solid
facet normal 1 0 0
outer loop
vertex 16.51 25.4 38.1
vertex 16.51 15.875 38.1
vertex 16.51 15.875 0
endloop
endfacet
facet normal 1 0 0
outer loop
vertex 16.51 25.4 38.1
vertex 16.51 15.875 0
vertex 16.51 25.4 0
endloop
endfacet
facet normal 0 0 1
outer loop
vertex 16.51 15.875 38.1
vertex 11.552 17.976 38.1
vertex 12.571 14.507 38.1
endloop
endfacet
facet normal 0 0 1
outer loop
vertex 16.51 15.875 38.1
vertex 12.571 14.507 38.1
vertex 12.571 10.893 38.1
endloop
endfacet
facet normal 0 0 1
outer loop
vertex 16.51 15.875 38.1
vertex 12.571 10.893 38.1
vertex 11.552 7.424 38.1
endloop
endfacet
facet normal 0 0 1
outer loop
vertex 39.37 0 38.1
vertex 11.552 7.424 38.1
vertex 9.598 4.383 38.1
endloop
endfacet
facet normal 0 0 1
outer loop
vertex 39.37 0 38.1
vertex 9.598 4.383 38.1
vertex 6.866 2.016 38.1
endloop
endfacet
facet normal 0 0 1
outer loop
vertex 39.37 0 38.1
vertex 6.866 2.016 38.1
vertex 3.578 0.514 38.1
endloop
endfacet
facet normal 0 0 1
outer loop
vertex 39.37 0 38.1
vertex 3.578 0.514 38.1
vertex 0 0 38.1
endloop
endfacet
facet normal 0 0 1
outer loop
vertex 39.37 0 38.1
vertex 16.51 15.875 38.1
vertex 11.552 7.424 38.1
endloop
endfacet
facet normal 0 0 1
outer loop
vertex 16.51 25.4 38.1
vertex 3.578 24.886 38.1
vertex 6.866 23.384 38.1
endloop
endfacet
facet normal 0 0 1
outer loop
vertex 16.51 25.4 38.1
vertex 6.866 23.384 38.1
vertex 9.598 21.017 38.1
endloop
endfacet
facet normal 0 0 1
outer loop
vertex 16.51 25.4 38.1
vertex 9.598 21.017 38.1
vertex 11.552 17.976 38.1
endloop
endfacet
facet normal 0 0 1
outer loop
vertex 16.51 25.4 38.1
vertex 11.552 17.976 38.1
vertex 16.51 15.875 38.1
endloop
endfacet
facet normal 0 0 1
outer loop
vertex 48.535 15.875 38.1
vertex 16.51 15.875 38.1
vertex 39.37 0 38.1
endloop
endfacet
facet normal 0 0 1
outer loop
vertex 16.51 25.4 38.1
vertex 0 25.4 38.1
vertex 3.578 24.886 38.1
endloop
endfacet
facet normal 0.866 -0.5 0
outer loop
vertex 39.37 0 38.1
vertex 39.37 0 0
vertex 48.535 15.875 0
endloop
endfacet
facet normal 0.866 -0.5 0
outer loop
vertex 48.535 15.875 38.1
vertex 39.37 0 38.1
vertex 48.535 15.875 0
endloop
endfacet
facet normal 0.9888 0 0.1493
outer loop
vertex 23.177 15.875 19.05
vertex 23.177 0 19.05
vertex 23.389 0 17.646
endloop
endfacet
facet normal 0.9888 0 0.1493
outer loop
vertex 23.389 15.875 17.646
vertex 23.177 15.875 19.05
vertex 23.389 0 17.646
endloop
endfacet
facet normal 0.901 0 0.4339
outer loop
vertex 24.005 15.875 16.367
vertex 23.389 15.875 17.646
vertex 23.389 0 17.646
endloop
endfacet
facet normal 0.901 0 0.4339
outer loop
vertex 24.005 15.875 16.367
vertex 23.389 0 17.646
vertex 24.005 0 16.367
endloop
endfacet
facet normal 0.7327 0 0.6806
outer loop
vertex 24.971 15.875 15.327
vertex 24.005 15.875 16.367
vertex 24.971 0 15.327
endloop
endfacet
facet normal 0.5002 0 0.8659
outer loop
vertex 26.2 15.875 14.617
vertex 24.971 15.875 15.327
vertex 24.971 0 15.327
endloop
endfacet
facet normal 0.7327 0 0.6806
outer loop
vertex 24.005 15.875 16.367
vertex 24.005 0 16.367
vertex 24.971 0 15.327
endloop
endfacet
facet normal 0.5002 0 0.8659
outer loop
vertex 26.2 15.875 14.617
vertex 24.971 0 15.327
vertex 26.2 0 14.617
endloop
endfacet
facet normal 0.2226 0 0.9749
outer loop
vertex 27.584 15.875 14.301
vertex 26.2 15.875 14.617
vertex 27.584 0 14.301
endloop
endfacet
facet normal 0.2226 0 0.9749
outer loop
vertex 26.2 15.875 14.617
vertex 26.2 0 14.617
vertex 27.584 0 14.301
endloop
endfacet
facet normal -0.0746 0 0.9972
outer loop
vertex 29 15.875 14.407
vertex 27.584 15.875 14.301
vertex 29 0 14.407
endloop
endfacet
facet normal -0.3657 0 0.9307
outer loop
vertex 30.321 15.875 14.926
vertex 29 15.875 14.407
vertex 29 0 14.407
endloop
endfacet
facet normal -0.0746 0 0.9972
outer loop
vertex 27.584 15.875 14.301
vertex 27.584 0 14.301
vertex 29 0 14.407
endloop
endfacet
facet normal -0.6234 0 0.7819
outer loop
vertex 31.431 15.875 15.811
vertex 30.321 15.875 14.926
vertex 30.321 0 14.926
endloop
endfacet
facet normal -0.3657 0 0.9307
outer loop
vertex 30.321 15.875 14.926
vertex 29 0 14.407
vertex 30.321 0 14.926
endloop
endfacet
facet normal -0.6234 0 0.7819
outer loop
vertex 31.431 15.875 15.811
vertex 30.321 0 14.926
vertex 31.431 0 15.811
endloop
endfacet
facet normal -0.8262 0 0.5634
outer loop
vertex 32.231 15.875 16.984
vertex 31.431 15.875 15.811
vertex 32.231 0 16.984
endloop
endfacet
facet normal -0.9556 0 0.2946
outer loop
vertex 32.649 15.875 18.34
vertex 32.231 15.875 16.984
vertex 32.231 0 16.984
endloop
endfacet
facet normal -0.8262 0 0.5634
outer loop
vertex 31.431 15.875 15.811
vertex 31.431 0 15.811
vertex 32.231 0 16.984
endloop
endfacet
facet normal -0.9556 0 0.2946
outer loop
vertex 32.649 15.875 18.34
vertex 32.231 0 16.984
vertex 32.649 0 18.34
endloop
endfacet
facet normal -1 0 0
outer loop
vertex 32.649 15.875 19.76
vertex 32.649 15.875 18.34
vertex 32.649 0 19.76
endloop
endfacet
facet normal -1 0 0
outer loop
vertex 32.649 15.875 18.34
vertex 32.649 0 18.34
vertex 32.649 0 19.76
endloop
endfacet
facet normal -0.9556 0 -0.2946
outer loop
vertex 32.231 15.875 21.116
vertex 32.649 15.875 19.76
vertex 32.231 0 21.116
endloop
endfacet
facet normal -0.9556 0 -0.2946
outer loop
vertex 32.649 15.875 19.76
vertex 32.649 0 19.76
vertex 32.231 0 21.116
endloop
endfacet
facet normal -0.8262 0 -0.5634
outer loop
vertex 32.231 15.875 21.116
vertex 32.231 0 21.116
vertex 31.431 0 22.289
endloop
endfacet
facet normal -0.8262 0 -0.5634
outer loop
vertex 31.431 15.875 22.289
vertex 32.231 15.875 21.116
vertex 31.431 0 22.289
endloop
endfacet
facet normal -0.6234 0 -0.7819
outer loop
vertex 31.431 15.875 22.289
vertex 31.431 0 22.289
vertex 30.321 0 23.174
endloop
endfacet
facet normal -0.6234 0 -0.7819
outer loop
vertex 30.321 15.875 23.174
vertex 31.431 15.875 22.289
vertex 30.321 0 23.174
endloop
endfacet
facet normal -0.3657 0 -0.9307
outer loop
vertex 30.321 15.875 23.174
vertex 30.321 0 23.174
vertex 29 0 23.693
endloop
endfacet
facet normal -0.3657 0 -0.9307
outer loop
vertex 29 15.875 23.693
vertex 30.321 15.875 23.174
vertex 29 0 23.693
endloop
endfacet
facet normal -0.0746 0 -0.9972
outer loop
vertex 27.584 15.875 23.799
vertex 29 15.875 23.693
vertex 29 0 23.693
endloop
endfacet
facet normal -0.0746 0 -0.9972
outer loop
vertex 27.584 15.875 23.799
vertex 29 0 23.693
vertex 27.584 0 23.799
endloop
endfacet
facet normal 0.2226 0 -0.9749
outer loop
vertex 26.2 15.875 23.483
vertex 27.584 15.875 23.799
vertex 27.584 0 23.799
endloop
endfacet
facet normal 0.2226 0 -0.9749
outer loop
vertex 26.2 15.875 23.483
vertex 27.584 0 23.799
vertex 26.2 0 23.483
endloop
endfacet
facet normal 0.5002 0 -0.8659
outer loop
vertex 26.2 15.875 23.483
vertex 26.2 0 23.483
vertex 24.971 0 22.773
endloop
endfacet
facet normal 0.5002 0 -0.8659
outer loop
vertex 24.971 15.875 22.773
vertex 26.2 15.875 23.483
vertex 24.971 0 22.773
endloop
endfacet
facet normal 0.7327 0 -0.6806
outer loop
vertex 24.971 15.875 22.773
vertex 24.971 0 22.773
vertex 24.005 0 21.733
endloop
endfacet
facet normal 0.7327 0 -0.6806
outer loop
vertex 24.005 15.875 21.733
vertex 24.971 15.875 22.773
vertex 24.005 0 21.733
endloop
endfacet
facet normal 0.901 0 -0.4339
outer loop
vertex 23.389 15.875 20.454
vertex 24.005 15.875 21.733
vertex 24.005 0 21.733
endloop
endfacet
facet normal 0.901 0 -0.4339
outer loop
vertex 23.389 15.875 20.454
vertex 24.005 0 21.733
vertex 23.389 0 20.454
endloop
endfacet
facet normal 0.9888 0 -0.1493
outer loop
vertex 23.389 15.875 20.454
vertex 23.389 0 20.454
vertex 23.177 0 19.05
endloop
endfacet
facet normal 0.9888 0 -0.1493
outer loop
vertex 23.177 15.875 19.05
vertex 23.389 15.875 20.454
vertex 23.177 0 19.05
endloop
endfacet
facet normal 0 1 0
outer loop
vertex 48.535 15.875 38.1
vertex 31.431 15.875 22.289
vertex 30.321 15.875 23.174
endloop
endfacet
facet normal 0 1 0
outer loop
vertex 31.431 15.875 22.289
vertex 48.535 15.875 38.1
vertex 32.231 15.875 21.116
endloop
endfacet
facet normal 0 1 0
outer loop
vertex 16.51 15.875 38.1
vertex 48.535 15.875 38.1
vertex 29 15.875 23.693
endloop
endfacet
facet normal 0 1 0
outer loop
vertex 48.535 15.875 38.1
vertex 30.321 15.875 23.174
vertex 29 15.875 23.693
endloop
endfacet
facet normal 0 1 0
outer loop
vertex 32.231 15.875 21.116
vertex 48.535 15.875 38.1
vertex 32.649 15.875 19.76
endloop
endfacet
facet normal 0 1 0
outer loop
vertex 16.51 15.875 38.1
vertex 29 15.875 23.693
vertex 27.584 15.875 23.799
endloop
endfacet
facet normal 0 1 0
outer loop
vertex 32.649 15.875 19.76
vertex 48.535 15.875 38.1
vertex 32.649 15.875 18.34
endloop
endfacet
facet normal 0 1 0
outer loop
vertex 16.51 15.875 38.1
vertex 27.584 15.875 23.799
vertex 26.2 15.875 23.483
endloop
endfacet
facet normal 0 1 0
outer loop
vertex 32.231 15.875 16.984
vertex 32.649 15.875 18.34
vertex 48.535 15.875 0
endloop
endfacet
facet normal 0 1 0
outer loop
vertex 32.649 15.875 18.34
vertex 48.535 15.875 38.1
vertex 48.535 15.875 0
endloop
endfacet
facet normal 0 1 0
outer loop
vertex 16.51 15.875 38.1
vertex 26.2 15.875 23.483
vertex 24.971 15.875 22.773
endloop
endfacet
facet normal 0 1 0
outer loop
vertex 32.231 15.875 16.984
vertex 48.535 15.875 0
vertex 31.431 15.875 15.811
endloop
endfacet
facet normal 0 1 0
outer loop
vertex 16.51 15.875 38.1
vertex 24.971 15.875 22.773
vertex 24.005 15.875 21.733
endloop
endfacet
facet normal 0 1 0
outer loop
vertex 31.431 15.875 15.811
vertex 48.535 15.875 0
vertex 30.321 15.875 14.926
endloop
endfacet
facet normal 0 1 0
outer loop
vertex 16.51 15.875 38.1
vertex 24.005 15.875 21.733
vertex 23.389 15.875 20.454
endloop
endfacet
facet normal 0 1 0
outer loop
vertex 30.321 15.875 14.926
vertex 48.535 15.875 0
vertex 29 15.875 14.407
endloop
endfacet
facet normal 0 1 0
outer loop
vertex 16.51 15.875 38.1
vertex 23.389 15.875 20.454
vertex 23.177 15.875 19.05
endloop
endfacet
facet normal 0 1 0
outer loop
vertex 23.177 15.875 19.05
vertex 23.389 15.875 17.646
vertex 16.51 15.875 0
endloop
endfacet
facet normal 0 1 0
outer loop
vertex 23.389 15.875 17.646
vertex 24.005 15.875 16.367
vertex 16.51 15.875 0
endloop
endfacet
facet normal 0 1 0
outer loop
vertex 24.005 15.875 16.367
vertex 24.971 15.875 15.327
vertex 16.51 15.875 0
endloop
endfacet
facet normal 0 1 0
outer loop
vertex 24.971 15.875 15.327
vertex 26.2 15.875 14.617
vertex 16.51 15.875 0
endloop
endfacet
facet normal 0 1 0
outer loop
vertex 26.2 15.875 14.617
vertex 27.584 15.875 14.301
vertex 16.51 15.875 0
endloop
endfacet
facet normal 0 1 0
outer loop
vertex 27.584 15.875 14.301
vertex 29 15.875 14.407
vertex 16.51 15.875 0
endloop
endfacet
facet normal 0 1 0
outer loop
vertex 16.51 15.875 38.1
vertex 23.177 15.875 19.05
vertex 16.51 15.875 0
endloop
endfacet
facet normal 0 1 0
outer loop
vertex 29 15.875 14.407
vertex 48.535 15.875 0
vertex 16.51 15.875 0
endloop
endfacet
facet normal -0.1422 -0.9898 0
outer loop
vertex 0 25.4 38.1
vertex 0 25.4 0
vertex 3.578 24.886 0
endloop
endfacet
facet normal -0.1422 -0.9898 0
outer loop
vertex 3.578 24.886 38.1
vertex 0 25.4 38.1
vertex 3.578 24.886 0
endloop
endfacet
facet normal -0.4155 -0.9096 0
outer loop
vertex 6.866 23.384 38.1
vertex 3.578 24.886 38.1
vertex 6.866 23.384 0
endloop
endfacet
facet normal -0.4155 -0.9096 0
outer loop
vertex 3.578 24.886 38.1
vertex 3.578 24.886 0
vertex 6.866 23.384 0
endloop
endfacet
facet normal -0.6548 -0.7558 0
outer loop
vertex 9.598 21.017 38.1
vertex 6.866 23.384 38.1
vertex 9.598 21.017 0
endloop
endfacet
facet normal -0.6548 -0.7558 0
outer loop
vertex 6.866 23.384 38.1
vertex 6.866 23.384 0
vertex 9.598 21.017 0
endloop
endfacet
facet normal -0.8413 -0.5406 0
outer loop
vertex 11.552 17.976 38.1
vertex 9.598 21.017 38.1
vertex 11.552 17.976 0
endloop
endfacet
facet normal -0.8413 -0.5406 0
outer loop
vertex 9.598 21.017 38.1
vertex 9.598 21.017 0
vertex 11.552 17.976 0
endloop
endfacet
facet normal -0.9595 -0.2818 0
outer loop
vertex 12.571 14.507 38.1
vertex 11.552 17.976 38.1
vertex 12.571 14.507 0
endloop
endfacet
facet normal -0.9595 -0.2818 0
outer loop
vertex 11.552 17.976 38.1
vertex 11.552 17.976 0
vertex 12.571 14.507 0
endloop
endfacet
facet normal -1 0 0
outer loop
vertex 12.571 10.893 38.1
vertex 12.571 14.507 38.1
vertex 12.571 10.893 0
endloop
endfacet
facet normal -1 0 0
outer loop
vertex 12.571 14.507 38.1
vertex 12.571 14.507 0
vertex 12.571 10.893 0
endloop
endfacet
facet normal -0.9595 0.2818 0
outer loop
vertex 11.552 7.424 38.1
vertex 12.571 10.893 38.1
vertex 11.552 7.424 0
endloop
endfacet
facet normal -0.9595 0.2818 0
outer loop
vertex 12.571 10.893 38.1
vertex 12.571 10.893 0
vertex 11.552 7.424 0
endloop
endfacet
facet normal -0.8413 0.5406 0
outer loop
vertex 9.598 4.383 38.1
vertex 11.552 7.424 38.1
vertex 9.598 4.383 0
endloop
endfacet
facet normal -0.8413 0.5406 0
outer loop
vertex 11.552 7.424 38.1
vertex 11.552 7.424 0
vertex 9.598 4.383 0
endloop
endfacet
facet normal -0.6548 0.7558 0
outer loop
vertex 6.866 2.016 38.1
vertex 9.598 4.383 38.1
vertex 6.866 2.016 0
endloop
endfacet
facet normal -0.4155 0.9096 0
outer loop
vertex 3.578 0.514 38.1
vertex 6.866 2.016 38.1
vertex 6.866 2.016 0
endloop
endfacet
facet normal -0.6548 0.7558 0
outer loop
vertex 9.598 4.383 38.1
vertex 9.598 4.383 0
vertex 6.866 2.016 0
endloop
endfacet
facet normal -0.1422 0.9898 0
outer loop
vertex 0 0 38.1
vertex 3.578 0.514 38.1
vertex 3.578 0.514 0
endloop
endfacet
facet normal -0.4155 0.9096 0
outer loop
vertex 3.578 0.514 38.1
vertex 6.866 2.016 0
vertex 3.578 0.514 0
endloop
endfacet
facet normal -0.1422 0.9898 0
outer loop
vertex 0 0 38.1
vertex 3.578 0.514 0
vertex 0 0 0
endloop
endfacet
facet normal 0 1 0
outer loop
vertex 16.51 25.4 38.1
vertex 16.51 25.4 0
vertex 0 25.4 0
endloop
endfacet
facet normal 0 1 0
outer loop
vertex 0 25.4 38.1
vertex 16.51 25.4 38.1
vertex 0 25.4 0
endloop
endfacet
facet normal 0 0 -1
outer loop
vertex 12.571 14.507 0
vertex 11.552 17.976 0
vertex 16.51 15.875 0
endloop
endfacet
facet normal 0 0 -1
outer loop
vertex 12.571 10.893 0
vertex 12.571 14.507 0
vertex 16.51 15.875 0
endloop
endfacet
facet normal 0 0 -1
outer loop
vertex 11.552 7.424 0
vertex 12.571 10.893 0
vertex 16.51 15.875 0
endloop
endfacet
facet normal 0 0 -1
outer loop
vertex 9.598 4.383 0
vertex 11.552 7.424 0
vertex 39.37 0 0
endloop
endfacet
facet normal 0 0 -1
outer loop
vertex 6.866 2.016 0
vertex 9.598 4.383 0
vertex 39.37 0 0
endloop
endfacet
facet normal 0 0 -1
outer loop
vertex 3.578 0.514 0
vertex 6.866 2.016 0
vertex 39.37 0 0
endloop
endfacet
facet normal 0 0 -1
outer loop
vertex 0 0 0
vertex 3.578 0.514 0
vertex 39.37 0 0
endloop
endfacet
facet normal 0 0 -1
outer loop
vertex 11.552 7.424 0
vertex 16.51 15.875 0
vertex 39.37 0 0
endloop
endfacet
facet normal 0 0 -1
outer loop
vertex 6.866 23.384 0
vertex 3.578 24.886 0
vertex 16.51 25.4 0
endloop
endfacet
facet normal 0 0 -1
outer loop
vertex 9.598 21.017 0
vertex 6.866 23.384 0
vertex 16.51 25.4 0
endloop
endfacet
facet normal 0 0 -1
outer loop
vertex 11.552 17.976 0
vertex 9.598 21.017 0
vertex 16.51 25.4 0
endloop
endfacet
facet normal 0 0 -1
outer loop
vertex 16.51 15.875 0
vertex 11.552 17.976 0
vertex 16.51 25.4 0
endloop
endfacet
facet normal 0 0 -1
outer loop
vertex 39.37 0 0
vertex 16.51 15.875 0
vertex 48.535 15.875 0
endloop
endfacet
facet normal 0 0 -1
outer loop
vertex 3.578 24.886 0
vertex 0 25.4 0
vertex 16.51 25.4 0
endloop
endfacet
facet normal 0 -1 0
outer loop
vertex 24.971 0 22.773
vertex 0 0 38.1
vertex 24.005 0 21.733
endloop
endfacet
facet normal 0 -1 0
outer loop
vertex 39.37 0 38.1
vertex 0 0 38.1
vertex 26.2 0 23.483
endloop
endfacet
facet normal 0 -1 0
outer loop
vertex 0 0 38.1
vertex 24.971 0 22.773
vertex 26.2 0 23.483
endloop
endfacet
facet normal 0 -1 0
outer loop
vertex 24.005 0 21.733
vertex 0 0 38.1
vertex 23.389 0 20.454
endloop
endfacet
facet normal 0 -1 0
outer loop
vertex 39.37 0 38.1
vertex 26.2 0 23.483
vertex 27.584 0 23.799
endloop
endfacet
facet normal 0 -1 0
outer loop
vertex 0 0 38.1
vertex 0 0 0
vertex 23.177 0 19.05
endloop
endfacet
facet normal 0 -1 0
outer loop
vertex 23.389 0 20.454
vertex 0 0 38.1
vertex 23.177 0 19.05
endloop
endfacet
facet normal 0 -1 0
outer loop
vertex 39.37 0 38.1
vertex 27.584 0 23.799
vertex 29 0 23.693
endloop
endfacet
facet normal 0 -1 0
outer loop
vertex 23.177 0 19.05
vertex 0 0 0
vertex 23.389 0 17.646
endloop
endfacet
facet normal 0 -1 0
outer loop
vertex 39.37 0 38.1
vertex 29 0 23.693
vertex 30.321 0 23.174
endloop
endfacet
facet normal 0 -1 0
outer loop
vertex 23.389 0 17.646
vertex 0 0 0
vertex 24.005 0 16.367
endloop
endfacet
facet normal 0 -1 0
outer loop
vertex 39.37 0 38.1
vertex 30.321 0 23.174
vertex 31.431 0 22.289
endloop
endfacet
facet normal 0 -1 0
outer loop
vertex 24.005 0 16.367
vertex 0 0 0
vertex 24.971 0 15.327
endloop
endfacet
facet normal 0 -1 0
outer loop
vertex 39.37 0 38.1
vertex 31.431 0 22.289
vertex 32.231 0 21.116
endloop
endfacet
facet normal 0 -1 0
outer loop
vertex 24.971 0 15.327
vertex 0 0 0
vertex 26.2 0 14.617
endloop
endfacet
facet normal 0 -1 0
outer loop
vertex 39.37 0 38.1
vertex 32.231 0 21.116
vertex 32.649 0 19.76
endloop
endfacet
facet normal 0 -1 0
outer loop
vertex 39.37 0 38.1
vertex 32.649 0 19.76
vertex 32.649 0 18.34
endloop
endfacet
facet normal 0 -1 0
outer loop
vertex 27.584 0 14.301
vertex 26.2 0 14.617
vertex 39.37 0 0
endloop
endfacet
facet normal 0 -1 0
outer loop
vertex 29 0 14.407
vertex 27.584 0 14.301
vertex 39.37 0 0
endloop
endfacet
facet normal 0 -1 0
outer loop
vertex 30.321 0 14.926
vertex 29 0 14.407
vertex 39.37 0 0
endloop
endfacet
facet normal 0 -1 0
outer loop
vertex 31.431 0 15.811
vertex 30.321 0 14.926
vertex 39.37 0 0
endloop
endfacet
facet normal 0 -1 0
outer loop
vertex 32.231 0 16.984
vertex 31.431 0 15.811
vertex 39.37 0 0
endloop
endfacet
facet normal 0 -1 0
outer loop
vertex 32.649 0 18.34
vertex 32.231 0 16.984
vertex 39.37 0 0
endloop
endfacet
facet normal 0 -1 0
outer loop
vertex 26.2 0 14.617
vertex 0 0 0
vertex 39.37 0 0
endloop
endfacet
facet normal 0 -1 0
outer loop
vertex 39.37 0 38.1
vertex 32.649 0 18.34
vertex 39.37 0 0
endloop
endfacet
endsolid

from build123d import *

# Parameters (mm, degrees)
BOSS_EXTRUDE1_DEPTH          = 38.1
CHAMFER1_SIZE                = 11.43
CHAMFER1_SIZE_2              = 19.797340731
F_3_8_0_375_DIAMETER_HOLE1_D = 9.525


with BuildPart() as part:
    # Sketch1 → Boss-Extrude1 (new body)
    with BuildSketch(Plane.XY):
        with BuildLine():
            Line((0, 0), (50.8, 0))
            Line((50.8, 0), (50.8, 15.875))
            Line((50.8, 15.875), (16.51, 15.875))
            Line((16.51, 15.875), (16.51, 25.4))
            Line((16.51, 25.4), (0, 25.4))
            ThreePointArc((0, 25.4), (12.7, 12.7), (0, 0))
        make_face()
    extrude(amount=BOSS_EXTRUDE1_DEPTH)

    # Chamfer1
    # the kernel refuses this chamfer: 19.797340731, 11.43 mm, written as the material it takes off along each edge
    with BuildSketch(Plane(origin=(50.8, 0, -51.217418184), x_dir=(-0.9983227437537926, -0.05789386240267138, 0), z_dir=(0, 0, 1))) as chamfer1_piece_1:
        Polygon((CHAMFER1_SIZE * 0.998322743754, -CHAMFER1_SIZE * 0.0578938624027), (-CHAMFER1_SIZE_2 * 0.0578938624012, -CHAMFER1_SIZE_2 * 0.998322743729), (0, 0), align=None)
    extrude(amount=140.534836368, mode=Mode.SUBTRACT)

    # 3/8 (0.375) Diameter Hole1 (through all)
    with Locations(Plane(origin=(0, 25.4, 0), x_dir=(1, 0, 0), z_dir=(0, 1, 0))):
        with Locations((27.939997923, -19.05)):
            Hole(F_3_8_0_375_DIAMETER_HOLE1_D / 2)


solid = part.part
